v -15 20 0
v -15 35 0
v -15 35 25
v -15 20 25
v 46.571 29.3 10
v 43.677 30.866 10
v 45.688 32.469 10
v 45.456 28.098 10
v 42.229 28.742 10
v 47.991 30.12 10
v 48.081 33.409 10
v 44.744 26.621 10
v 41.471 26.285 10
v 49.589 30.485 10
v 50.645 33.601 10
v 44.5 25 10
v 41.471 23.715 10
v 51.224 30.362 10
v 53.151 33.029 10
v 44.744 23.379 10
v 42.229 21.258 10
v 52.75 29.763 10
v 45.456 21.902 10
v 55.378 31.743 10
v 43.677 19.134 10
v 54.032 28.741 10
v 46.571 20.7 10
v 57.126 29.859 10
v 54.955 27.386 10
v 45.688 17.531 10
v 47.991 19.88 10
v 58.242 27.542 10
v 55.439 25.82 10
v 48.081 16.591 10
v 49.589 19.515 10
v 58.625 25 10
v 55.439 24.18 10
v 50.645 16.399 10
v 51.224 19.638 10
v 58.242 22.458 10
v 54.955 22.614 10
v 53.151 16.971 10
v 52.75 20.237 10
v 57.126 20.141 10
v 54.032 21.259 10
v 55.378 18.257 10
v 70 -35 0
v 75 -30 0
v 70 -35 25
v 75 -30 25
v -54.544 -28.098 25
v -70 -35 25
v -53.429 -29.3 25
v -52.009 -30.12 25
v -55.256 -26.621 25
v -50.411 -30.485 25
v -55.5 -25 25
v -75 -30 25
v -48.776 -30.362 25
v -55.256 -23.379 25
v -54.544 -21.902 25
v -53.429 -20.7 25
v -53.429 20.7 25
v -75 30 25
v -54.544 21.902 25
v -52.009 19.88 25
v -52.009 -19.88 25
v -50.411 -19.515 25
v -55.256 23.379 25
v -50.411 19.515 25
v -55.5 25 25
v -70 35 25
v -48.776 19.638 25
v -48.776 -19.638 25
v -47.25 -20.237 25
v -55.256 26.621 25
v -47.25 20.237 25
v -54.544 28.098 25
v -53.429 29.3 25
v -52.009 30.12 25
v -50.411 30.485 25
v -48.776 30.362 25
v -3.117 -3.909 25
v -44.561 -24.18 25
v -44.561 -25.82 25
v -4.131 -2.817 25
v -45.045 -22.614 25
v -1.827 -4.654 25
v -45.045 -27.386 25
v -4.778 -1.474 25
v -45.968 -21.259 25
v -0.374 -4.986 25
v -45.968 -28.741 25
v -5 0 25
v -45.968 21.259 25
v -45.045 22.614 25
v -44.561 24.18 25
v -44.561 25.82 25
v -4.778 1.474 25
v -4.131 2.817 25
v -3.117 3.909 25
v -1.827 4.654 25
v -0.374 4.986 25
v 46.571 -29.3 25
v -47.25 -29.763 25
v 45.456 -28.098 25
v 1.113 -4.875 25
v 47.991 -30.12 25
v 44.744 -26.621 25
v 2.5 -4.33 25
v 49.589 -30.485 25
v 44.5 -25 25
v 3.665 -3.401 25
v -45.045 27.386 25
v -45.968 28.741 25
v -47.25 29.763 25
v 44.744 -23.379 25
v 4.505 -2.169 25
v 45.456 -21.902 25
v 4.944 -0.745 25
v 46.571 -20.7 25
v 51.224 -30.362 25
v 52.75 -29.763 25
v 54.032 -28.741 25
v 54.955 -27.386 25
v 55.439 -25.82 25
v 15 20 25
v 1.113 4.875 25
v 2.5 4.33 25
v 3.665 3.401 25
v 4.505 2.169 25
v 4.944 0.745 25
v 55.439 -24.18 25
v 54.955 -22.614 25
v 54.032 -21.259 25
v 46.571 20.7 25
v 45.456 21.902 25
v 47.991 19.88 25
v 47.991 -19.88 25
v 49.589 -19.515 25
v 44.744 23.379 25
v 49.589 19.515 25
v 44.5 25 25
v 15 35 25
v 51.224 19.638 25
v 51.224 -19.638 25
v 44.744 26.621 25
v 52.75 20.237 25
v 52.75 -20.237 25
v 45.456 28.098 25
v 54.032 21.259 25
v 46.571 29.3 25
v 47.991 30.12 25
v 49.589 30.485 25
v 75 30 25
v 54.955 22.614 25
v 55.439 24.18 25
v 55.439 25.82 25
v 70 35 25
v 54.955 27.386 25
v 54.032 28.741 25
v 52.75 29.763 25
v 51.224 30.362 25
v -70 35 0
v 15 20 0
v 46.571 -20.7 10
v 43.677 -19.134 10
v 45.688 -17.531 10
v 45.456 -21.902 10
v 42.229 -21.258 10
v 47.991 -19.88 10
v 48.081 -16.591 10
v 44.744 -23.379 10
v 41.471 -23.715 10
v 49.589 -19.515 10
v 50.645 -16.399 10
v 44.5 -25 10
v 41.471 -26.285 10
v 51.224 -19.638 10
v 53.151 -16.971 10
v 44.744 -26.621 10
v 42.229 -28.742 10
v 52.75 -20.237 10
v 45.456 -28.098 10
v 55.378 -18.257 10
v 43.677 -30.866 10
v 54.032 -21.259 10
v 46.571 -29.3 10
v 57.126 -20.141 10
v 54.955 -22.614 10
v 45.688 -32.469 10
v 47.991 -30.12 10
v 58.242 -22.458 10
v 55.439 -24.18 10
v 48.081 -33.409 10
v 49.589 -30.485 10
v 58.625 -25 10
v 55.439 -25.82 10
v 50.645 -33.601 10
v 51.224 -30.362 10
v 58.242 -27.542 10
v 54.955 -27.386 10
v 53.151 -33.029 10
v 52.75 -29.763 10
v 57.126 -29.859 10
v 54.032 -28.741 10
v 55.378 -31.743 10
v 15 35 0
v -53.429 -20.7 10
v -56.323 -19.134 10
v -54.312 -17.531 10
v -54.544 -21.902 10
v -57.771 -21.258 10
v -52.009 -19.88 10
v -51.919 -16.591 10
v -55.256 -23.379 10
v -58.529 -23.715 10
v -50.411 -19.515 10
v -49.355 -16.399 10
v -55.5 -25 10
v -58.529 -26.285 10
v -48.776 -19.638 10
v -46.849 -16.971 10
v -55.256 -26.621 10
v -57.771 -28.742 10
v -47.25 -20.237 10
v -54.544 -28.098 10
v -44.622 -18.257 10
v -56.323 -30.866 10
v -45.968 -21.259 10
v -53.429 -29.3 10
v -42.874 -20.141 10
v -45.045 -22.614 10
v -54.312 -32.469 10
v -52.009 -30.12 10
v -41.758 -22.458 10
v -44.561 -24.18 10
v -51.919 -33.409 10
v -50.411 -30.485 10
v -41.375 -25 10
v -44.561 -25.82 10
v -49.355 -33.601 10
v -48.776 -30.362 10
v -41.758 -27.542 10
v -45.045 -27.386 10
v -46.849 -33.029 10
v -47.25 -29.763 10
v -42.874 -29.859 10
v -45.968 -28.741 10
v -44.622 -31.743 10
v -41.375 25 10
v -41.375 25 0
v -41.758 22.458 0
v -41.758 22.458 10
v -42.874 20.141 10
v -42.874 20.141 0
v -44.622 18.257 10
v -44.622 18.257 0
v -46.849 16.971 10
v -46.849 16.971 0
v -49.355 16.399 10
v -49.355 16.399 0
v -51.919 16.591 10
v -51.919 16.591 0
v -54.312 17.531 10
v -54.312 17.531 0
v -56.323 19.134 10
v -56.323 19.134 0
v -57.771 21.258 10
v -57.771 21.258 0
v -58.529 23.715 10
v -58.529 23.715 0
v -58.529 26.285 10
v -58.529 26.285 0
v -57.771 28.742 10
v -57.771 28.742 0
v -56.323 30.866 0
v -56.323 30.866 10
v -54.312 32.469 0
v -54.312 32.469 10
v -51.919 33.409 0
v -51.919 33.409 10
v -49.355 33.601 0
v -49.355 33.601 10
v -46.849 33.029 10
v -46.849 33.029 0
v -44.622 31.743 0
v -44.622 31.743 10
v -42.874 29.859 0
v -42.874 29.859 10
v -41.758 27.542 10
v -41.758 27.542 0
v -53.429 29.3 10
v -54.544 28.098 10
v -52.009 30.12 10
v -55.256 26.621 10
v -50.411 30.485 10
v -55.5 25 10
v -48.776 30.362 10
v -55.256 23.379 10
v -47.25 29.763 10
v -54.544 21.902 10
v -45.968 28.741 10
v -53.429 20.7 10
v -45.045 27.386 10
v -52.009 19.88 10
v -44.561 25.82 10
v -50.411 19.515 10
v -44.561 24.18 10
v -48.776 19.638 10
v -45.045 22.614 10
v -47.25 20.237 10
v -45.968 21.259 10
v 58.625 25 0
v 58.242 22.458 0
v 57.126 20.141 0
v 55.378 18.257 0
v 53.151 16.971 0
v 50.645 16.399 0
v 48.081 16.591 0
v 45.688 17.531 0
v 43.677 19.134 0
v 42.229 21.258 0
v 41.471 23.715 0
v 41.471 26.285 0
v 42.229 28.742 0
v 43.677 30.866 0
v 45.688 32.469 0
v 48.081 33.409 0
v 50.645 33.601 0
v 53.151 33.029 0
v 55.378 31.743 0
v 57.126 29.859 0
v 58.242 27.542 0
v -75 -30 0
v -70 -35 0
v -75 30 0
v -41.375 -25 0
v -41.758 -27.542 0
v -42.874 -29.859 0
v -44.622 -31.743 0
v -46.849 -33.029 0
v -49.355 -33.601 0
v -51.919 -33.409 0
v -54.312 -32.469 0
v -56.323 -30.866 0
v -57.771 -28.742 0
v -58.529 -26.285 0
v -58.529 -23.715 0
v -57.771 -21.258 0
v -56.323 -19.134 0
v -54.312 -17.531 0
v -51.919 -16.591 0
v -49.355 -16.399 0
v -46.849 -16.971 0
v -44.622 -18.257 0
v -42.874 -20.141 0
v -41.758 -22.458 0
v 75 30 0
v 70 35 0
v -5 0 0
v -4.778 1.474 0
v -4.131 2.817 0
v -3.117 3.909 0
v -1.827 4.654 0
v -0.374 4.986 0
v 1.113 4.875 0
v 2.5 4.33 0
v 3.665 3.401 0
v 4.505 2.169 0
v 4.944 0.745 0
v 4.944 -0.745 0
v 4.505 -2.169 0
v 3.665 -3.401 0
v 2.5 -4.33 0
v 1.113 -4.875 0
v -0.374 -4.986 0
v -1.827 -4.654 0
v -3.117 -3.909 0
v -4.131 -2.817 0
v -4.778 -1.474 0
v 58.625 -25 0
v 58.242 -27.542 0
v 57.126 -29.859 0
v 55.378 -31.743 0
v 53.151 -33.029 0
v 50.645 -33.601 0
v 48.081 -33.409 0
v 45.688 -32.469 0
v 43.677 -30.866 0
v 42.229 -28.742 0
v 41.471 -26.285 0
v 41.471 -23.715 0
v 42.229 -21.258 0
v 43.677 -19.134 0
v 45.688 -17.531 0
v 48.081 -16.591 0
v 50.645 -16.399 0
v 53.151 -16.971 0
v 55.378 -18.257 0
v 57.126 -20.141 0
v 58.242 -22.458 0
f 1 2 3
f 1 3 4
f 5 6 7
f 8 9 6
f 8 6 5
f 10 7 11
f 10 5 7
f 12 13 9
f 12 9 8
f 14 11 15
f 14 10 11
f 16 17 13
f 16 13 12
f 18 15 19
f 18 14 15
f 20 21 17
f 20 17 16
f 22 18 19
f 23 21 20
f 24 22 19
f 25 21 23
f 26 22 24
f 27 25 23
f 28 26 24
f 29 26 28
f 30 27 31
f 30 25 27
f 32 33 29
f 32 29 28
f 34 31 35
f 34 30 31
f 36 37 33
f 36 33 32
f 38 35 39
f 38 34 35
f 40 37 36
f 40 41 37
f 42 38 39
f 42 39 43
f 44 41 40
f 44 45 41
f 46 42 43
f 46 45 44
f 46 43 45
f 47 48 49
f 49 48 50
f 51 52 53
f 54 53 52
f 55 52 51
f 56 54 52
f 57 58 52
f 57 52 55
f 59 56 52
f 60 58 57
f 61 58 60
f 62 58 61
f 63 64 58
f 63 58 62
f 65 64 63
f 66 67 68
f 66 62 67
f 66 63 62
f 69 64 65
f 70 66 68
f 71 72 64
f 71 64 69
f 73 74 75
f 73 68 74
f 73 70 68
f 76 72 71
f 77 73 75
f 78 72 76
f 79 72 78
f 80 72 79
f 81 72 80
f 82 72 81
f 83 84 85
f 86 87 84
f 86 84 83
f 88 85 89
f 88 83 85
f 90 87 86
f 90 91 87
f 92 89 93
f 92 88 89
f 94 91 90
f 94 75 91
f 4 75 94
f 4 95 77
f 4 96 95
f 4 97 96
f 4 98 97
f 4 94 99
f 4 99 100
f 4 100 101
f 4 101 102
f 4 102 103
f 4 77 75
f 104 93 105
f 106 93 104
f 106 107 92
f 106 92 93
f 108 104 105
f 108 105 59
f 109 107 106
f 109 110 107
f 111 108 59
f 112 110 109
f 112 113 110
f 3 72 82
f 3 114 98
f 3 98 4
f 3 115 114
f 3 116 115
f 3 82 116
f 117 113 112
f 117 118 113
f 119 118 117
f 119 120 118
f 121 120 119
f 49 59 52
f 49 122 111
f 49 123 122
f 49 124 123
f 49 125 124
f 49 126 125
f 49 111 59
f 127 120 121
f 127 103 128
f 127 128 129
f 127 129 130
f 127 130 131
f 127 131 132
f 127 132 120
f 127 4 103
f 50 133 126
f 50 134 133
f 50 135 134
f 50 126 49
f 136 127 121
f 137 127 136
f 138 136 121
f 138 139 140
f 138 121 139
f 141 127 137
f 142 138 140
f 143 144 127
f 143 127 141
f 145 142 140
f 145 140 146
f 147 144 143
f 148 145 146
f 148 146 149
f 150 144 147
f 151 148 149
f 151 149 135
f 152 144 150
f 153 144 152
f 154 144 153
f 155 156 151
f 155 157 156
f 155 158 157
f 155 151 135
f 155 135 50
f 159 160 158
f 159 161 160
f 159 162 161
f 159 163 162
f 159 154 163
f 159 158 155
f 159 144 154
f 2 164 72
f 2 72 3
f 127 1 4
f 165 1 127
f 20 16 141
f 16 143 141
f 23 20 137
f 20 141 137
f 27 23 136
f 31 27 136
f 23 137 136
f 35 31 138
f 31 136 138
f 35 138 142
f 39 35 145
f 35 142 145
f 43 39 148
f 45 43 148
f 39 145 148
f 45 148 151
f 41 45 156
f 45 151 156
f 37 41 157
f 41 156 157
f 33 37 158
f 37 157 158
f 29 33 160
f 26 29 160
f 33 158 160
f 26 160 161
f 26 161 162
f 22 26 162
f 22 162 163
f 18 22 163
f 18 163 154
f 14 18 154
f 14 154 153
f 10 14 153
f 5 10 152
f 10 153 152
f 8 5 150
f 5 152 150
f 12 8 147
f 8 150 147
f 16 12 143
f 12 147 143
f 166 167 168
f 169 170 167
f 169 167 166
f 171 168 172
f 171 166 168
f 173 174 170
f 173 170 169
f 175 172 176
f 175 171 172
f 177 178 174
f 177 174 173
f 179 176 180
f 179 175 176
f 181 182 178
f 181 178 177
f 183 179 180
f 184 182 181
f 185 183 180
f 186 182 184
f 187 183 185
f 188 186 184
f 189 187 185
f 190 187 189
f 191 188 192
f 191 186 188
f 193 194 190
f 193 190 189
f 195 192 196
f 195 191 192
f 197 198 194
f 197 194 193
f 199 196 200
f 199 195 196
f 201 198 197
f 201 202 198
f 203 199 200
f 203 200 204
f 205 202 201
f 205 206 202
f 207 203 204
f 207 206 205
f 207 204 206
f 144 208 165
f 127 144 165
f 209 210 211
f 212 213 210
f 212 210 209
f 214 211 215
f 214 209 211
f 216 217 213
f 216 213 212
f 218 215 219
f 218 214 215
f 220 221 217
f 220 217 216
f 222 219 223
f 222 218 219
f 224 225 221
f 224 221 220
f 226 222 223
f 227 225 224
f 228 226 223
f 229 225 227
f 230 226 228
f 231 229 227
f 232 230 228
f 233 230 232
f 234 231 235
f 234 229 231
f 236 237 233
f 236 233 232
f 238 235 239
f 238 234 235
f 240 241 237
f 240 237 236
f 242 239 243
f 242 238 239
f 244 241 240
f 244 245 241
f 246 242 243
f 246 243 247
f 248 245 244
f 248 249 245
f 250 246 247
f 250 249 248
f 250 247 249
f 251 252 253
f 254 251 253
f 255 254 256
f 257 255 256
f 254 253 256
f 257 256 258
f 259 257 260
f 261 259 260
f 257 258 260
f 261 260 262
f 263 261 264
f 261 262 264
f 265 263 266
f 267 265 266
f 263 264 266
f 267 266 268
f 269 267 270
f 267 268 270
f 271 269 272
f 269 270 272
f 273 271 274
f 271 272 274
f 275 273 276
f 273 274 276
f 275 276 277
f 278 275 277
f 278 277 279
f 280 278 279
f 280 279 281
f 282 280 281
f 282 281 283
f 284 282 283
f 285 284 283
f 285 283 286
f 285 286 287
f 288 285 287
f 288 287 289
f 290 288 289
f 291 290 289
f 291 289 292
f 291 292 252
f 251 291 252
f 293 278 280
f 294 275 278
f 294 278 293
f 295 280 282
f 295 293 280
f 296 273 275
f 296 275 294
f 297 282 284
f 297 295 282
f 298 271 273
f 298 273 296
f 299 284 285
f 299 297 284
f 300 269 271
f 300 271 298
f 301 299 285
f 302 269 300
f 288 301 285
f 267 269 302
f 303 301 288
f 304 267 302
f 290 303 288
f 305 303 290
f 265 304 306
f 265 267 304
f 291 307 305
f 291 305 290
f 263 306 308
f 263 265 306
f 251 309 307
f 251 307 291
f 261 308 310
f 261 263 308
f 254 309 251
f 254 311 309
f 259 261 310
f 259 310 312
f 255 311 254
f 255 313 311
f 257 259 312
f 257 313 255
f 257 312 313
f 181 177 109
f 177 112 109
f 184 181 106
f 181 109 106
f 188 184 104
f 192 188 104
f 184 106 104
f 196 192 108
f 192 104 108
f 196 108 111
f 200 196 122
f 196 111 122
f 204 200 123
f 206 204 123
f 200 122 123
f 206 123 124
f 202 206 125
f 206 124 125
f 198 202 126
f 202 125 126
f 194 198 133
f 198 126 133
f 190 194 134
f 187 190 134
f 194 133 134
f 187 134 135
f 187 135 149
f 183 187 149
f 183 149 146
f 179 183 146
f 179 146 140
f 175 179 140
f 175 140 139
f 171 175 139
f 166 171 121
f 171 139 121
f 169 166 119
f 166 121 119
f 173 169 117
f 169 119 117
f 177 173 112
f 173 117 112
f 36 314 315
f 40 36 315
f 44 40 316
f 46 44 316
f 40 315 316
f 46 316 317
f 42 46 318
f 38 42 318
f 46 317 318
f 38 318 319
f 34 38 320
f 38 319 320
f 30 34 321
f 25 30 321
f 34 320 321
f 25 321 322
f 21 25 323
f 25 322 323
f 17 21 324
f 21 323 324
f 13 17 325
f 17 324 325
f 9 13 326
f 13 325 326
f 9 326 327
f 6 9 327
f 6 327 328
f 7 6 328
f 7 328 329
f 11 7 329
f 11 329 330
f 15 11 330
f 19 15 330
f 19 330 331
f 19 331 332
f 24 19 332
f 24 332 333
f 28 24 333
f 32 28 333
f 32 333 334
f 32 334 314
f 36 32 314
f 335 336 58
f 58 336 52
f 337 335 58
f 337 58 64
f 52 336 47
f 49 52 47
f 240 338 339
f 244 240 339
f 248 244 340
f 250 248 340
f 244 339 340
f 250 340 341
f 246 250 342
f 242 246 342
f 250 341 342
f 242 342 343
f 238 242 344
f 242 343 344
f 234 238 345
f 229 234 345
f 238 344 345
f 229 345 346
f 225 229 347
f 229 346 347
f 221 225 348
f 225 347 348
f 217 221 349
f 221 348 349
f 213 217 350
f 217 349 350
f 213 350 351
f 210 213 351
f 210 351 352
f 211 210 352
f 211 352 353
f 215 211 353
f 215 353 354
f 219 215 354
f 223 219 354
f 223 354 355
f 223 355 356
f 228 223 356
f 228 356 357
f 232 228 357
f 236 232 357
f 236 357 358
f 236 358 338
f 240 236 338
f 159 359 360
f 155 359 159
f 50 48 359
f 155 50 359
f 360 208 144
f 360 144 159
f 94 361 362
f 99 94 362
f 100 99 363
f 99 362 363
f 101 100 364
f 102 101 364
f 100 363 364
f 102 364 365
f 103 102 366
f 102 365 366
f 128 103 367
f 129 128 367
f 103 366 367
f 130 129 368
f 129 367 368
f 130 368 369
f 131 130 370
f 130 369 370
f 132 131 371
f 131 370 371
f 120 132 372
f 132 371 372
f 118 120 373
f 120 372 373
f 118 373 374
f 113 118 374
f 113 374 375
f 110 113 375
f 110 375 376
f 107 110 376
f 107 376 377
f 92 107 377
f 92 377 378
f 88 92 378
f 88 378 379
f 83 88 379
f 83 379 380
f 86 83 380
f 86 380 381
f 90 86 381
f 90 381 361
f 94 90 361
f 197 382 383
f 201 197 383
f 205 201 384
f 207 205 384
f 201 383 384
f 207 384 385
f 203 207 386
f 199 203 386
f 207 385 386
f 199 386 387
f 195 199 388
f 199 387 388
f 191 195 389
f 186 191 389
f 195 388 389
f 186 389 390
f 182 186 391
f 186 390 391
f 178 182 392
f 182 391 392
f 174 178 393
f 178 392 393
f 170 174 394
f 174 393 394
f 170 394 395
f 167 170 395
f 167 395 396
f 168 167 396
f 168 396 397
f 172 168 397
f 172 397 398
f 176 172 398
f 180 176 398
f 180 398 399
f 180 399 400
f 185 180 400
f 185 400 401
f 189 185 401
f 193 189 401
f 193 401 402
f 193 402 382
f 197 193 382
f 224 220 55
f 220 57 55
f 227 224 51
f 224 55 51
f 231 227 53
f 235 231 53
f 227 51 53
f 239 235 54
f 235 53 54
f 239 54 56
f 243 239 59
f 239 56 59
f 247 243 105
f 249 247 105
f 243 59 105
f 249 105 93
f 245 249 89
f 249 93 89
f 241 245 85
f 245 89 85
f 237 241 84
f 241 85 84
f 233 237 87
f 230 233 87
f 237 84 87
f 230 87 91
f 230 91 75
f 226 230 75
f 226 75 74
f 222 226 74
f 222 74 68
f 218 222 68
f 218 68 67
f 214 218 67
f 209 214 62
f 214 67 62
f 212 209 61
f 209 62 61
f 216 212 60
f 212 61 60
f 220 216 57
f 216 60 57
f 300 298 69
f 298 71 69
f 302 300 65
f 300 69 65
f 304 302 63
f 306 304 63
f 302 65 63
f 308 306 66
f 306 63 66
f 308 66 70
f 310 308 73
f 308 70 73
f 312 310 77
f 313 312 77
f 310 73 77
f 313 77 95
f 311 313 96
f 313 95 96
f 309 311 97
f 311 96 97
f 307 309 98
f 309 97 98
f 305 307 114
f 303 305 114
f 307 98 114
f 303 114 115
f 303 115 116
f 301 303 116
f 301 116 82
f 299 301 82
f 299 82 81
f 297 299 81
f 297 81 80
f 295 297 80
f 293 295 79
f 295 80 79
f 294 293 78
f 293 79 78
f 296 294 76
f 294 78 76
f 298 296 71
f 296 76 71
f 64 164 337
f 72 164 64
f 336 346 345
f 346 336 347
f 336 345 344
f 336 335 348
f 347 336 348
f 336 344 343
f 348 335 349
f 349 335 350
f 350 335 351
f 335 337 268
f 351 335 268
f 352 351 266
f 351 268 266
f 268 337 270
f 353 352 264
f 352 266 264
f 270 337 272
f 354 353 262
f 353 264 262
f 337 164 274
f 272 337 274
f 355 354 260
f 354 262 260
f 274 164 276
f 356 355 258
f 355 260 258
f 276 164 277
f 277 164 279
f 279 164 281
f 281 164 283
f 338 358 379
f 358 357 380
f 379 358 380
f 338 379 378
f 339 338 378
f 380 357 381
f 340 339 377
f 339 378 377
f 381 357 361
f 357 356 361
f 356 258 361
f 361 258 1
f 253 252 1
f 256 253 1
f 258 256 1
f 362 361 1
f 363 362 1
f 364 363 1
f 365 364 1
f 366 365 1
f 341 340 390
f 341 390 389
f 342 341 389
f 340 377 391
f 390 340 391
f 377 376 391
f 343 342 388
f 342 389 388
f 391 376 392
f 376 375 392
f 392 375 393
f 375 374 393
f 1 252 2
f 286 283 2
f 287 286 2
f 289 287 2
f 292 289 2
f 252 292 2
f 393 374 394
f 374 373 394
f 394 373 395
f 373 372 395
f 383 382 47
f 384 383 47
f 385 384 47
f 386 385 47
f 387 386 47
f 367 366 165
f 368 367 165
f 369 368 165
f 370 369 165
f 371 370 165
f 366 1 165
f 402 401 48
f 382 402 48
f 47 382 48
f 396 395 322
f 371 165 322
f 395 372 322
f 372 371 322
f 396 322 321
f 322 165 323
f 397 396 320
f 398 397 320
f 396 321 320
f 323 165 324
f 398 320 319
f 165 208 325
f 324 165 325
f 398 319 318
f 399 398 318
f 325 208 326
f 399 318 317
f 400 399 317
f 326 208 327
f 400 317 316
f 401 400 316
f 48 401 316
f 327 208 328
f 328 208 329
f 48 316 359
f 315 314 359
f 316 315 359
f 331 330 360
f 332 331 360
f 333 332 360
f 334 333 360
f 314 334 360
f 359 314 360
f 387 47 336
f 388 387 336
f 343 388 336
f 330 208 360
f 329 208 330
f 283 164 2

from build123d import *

# Parameters (mm, degrees)
F0_W           = 150
F0_H           = 70
F1_DEPTH       = 25
F3_D           = 11
F3_CBORE_D     = 17.25
F3_CBORE_DEPTH = 10
F4_SIZE        = 5
F5_SIZE        = 5
F6_W           = 30
F6_H           = 25
F7_DEPTH       = 25
F9_D           = 10


with BuildPart() as f1:
    # F0 (on Top) → F1 (new body)
    with BuildSketch(Plane.XY):
        Rectangle(F0_W, F0_H)
    extrude(amount=F1_DEPTH)

    # F3 (through all)
    with Locations(Plane(origin=(0, 0, 0), x_dir=(1, 0, 0), z_dir=(0, 0, -1))):
        with Locations((-50, -25), (-50, 25), (50, 25), (50, -25)):
            CounterBoreHole(F3_D / 2, F3_CBORE_D / 2, F3_CBORE_DEPTH)

    # F4
    f4_edges = [f1.edges().sort_by_distance(p)[0] for p in [
        (-75, 35, 12.5),
        (-75, -35, 12.5),
    ]]
    chamfer(f4_edges, length=F4_SIZE)

    # F5
    f5_edges = [f1.edges().sort_by_distance(p)[0] for p in [
        (75, 35, 12.5),
        (75, -35, 12.5),
    ]]
    chamfer(f5_edges, length=F5_SIZE)

    # F6 (on face) → F7 (cut)
    with BuildSketch(Plane(origin=(0, 0, 0), x_dir=(1, 0, 0), z_dir=(0, 0, -1))):
        with Locations((0, -32.5)):
            Rectangle(F6_W, F6_H)
    extrude(amount=-F7_DEPTH, mode=Mode.SUBTRACT)

    # F9 (through all)
    with Locations(Plane.XY.offset(25)):
        with Locations((0, 0)):
            Hole(F9_D / 2)


solid = f1.part
